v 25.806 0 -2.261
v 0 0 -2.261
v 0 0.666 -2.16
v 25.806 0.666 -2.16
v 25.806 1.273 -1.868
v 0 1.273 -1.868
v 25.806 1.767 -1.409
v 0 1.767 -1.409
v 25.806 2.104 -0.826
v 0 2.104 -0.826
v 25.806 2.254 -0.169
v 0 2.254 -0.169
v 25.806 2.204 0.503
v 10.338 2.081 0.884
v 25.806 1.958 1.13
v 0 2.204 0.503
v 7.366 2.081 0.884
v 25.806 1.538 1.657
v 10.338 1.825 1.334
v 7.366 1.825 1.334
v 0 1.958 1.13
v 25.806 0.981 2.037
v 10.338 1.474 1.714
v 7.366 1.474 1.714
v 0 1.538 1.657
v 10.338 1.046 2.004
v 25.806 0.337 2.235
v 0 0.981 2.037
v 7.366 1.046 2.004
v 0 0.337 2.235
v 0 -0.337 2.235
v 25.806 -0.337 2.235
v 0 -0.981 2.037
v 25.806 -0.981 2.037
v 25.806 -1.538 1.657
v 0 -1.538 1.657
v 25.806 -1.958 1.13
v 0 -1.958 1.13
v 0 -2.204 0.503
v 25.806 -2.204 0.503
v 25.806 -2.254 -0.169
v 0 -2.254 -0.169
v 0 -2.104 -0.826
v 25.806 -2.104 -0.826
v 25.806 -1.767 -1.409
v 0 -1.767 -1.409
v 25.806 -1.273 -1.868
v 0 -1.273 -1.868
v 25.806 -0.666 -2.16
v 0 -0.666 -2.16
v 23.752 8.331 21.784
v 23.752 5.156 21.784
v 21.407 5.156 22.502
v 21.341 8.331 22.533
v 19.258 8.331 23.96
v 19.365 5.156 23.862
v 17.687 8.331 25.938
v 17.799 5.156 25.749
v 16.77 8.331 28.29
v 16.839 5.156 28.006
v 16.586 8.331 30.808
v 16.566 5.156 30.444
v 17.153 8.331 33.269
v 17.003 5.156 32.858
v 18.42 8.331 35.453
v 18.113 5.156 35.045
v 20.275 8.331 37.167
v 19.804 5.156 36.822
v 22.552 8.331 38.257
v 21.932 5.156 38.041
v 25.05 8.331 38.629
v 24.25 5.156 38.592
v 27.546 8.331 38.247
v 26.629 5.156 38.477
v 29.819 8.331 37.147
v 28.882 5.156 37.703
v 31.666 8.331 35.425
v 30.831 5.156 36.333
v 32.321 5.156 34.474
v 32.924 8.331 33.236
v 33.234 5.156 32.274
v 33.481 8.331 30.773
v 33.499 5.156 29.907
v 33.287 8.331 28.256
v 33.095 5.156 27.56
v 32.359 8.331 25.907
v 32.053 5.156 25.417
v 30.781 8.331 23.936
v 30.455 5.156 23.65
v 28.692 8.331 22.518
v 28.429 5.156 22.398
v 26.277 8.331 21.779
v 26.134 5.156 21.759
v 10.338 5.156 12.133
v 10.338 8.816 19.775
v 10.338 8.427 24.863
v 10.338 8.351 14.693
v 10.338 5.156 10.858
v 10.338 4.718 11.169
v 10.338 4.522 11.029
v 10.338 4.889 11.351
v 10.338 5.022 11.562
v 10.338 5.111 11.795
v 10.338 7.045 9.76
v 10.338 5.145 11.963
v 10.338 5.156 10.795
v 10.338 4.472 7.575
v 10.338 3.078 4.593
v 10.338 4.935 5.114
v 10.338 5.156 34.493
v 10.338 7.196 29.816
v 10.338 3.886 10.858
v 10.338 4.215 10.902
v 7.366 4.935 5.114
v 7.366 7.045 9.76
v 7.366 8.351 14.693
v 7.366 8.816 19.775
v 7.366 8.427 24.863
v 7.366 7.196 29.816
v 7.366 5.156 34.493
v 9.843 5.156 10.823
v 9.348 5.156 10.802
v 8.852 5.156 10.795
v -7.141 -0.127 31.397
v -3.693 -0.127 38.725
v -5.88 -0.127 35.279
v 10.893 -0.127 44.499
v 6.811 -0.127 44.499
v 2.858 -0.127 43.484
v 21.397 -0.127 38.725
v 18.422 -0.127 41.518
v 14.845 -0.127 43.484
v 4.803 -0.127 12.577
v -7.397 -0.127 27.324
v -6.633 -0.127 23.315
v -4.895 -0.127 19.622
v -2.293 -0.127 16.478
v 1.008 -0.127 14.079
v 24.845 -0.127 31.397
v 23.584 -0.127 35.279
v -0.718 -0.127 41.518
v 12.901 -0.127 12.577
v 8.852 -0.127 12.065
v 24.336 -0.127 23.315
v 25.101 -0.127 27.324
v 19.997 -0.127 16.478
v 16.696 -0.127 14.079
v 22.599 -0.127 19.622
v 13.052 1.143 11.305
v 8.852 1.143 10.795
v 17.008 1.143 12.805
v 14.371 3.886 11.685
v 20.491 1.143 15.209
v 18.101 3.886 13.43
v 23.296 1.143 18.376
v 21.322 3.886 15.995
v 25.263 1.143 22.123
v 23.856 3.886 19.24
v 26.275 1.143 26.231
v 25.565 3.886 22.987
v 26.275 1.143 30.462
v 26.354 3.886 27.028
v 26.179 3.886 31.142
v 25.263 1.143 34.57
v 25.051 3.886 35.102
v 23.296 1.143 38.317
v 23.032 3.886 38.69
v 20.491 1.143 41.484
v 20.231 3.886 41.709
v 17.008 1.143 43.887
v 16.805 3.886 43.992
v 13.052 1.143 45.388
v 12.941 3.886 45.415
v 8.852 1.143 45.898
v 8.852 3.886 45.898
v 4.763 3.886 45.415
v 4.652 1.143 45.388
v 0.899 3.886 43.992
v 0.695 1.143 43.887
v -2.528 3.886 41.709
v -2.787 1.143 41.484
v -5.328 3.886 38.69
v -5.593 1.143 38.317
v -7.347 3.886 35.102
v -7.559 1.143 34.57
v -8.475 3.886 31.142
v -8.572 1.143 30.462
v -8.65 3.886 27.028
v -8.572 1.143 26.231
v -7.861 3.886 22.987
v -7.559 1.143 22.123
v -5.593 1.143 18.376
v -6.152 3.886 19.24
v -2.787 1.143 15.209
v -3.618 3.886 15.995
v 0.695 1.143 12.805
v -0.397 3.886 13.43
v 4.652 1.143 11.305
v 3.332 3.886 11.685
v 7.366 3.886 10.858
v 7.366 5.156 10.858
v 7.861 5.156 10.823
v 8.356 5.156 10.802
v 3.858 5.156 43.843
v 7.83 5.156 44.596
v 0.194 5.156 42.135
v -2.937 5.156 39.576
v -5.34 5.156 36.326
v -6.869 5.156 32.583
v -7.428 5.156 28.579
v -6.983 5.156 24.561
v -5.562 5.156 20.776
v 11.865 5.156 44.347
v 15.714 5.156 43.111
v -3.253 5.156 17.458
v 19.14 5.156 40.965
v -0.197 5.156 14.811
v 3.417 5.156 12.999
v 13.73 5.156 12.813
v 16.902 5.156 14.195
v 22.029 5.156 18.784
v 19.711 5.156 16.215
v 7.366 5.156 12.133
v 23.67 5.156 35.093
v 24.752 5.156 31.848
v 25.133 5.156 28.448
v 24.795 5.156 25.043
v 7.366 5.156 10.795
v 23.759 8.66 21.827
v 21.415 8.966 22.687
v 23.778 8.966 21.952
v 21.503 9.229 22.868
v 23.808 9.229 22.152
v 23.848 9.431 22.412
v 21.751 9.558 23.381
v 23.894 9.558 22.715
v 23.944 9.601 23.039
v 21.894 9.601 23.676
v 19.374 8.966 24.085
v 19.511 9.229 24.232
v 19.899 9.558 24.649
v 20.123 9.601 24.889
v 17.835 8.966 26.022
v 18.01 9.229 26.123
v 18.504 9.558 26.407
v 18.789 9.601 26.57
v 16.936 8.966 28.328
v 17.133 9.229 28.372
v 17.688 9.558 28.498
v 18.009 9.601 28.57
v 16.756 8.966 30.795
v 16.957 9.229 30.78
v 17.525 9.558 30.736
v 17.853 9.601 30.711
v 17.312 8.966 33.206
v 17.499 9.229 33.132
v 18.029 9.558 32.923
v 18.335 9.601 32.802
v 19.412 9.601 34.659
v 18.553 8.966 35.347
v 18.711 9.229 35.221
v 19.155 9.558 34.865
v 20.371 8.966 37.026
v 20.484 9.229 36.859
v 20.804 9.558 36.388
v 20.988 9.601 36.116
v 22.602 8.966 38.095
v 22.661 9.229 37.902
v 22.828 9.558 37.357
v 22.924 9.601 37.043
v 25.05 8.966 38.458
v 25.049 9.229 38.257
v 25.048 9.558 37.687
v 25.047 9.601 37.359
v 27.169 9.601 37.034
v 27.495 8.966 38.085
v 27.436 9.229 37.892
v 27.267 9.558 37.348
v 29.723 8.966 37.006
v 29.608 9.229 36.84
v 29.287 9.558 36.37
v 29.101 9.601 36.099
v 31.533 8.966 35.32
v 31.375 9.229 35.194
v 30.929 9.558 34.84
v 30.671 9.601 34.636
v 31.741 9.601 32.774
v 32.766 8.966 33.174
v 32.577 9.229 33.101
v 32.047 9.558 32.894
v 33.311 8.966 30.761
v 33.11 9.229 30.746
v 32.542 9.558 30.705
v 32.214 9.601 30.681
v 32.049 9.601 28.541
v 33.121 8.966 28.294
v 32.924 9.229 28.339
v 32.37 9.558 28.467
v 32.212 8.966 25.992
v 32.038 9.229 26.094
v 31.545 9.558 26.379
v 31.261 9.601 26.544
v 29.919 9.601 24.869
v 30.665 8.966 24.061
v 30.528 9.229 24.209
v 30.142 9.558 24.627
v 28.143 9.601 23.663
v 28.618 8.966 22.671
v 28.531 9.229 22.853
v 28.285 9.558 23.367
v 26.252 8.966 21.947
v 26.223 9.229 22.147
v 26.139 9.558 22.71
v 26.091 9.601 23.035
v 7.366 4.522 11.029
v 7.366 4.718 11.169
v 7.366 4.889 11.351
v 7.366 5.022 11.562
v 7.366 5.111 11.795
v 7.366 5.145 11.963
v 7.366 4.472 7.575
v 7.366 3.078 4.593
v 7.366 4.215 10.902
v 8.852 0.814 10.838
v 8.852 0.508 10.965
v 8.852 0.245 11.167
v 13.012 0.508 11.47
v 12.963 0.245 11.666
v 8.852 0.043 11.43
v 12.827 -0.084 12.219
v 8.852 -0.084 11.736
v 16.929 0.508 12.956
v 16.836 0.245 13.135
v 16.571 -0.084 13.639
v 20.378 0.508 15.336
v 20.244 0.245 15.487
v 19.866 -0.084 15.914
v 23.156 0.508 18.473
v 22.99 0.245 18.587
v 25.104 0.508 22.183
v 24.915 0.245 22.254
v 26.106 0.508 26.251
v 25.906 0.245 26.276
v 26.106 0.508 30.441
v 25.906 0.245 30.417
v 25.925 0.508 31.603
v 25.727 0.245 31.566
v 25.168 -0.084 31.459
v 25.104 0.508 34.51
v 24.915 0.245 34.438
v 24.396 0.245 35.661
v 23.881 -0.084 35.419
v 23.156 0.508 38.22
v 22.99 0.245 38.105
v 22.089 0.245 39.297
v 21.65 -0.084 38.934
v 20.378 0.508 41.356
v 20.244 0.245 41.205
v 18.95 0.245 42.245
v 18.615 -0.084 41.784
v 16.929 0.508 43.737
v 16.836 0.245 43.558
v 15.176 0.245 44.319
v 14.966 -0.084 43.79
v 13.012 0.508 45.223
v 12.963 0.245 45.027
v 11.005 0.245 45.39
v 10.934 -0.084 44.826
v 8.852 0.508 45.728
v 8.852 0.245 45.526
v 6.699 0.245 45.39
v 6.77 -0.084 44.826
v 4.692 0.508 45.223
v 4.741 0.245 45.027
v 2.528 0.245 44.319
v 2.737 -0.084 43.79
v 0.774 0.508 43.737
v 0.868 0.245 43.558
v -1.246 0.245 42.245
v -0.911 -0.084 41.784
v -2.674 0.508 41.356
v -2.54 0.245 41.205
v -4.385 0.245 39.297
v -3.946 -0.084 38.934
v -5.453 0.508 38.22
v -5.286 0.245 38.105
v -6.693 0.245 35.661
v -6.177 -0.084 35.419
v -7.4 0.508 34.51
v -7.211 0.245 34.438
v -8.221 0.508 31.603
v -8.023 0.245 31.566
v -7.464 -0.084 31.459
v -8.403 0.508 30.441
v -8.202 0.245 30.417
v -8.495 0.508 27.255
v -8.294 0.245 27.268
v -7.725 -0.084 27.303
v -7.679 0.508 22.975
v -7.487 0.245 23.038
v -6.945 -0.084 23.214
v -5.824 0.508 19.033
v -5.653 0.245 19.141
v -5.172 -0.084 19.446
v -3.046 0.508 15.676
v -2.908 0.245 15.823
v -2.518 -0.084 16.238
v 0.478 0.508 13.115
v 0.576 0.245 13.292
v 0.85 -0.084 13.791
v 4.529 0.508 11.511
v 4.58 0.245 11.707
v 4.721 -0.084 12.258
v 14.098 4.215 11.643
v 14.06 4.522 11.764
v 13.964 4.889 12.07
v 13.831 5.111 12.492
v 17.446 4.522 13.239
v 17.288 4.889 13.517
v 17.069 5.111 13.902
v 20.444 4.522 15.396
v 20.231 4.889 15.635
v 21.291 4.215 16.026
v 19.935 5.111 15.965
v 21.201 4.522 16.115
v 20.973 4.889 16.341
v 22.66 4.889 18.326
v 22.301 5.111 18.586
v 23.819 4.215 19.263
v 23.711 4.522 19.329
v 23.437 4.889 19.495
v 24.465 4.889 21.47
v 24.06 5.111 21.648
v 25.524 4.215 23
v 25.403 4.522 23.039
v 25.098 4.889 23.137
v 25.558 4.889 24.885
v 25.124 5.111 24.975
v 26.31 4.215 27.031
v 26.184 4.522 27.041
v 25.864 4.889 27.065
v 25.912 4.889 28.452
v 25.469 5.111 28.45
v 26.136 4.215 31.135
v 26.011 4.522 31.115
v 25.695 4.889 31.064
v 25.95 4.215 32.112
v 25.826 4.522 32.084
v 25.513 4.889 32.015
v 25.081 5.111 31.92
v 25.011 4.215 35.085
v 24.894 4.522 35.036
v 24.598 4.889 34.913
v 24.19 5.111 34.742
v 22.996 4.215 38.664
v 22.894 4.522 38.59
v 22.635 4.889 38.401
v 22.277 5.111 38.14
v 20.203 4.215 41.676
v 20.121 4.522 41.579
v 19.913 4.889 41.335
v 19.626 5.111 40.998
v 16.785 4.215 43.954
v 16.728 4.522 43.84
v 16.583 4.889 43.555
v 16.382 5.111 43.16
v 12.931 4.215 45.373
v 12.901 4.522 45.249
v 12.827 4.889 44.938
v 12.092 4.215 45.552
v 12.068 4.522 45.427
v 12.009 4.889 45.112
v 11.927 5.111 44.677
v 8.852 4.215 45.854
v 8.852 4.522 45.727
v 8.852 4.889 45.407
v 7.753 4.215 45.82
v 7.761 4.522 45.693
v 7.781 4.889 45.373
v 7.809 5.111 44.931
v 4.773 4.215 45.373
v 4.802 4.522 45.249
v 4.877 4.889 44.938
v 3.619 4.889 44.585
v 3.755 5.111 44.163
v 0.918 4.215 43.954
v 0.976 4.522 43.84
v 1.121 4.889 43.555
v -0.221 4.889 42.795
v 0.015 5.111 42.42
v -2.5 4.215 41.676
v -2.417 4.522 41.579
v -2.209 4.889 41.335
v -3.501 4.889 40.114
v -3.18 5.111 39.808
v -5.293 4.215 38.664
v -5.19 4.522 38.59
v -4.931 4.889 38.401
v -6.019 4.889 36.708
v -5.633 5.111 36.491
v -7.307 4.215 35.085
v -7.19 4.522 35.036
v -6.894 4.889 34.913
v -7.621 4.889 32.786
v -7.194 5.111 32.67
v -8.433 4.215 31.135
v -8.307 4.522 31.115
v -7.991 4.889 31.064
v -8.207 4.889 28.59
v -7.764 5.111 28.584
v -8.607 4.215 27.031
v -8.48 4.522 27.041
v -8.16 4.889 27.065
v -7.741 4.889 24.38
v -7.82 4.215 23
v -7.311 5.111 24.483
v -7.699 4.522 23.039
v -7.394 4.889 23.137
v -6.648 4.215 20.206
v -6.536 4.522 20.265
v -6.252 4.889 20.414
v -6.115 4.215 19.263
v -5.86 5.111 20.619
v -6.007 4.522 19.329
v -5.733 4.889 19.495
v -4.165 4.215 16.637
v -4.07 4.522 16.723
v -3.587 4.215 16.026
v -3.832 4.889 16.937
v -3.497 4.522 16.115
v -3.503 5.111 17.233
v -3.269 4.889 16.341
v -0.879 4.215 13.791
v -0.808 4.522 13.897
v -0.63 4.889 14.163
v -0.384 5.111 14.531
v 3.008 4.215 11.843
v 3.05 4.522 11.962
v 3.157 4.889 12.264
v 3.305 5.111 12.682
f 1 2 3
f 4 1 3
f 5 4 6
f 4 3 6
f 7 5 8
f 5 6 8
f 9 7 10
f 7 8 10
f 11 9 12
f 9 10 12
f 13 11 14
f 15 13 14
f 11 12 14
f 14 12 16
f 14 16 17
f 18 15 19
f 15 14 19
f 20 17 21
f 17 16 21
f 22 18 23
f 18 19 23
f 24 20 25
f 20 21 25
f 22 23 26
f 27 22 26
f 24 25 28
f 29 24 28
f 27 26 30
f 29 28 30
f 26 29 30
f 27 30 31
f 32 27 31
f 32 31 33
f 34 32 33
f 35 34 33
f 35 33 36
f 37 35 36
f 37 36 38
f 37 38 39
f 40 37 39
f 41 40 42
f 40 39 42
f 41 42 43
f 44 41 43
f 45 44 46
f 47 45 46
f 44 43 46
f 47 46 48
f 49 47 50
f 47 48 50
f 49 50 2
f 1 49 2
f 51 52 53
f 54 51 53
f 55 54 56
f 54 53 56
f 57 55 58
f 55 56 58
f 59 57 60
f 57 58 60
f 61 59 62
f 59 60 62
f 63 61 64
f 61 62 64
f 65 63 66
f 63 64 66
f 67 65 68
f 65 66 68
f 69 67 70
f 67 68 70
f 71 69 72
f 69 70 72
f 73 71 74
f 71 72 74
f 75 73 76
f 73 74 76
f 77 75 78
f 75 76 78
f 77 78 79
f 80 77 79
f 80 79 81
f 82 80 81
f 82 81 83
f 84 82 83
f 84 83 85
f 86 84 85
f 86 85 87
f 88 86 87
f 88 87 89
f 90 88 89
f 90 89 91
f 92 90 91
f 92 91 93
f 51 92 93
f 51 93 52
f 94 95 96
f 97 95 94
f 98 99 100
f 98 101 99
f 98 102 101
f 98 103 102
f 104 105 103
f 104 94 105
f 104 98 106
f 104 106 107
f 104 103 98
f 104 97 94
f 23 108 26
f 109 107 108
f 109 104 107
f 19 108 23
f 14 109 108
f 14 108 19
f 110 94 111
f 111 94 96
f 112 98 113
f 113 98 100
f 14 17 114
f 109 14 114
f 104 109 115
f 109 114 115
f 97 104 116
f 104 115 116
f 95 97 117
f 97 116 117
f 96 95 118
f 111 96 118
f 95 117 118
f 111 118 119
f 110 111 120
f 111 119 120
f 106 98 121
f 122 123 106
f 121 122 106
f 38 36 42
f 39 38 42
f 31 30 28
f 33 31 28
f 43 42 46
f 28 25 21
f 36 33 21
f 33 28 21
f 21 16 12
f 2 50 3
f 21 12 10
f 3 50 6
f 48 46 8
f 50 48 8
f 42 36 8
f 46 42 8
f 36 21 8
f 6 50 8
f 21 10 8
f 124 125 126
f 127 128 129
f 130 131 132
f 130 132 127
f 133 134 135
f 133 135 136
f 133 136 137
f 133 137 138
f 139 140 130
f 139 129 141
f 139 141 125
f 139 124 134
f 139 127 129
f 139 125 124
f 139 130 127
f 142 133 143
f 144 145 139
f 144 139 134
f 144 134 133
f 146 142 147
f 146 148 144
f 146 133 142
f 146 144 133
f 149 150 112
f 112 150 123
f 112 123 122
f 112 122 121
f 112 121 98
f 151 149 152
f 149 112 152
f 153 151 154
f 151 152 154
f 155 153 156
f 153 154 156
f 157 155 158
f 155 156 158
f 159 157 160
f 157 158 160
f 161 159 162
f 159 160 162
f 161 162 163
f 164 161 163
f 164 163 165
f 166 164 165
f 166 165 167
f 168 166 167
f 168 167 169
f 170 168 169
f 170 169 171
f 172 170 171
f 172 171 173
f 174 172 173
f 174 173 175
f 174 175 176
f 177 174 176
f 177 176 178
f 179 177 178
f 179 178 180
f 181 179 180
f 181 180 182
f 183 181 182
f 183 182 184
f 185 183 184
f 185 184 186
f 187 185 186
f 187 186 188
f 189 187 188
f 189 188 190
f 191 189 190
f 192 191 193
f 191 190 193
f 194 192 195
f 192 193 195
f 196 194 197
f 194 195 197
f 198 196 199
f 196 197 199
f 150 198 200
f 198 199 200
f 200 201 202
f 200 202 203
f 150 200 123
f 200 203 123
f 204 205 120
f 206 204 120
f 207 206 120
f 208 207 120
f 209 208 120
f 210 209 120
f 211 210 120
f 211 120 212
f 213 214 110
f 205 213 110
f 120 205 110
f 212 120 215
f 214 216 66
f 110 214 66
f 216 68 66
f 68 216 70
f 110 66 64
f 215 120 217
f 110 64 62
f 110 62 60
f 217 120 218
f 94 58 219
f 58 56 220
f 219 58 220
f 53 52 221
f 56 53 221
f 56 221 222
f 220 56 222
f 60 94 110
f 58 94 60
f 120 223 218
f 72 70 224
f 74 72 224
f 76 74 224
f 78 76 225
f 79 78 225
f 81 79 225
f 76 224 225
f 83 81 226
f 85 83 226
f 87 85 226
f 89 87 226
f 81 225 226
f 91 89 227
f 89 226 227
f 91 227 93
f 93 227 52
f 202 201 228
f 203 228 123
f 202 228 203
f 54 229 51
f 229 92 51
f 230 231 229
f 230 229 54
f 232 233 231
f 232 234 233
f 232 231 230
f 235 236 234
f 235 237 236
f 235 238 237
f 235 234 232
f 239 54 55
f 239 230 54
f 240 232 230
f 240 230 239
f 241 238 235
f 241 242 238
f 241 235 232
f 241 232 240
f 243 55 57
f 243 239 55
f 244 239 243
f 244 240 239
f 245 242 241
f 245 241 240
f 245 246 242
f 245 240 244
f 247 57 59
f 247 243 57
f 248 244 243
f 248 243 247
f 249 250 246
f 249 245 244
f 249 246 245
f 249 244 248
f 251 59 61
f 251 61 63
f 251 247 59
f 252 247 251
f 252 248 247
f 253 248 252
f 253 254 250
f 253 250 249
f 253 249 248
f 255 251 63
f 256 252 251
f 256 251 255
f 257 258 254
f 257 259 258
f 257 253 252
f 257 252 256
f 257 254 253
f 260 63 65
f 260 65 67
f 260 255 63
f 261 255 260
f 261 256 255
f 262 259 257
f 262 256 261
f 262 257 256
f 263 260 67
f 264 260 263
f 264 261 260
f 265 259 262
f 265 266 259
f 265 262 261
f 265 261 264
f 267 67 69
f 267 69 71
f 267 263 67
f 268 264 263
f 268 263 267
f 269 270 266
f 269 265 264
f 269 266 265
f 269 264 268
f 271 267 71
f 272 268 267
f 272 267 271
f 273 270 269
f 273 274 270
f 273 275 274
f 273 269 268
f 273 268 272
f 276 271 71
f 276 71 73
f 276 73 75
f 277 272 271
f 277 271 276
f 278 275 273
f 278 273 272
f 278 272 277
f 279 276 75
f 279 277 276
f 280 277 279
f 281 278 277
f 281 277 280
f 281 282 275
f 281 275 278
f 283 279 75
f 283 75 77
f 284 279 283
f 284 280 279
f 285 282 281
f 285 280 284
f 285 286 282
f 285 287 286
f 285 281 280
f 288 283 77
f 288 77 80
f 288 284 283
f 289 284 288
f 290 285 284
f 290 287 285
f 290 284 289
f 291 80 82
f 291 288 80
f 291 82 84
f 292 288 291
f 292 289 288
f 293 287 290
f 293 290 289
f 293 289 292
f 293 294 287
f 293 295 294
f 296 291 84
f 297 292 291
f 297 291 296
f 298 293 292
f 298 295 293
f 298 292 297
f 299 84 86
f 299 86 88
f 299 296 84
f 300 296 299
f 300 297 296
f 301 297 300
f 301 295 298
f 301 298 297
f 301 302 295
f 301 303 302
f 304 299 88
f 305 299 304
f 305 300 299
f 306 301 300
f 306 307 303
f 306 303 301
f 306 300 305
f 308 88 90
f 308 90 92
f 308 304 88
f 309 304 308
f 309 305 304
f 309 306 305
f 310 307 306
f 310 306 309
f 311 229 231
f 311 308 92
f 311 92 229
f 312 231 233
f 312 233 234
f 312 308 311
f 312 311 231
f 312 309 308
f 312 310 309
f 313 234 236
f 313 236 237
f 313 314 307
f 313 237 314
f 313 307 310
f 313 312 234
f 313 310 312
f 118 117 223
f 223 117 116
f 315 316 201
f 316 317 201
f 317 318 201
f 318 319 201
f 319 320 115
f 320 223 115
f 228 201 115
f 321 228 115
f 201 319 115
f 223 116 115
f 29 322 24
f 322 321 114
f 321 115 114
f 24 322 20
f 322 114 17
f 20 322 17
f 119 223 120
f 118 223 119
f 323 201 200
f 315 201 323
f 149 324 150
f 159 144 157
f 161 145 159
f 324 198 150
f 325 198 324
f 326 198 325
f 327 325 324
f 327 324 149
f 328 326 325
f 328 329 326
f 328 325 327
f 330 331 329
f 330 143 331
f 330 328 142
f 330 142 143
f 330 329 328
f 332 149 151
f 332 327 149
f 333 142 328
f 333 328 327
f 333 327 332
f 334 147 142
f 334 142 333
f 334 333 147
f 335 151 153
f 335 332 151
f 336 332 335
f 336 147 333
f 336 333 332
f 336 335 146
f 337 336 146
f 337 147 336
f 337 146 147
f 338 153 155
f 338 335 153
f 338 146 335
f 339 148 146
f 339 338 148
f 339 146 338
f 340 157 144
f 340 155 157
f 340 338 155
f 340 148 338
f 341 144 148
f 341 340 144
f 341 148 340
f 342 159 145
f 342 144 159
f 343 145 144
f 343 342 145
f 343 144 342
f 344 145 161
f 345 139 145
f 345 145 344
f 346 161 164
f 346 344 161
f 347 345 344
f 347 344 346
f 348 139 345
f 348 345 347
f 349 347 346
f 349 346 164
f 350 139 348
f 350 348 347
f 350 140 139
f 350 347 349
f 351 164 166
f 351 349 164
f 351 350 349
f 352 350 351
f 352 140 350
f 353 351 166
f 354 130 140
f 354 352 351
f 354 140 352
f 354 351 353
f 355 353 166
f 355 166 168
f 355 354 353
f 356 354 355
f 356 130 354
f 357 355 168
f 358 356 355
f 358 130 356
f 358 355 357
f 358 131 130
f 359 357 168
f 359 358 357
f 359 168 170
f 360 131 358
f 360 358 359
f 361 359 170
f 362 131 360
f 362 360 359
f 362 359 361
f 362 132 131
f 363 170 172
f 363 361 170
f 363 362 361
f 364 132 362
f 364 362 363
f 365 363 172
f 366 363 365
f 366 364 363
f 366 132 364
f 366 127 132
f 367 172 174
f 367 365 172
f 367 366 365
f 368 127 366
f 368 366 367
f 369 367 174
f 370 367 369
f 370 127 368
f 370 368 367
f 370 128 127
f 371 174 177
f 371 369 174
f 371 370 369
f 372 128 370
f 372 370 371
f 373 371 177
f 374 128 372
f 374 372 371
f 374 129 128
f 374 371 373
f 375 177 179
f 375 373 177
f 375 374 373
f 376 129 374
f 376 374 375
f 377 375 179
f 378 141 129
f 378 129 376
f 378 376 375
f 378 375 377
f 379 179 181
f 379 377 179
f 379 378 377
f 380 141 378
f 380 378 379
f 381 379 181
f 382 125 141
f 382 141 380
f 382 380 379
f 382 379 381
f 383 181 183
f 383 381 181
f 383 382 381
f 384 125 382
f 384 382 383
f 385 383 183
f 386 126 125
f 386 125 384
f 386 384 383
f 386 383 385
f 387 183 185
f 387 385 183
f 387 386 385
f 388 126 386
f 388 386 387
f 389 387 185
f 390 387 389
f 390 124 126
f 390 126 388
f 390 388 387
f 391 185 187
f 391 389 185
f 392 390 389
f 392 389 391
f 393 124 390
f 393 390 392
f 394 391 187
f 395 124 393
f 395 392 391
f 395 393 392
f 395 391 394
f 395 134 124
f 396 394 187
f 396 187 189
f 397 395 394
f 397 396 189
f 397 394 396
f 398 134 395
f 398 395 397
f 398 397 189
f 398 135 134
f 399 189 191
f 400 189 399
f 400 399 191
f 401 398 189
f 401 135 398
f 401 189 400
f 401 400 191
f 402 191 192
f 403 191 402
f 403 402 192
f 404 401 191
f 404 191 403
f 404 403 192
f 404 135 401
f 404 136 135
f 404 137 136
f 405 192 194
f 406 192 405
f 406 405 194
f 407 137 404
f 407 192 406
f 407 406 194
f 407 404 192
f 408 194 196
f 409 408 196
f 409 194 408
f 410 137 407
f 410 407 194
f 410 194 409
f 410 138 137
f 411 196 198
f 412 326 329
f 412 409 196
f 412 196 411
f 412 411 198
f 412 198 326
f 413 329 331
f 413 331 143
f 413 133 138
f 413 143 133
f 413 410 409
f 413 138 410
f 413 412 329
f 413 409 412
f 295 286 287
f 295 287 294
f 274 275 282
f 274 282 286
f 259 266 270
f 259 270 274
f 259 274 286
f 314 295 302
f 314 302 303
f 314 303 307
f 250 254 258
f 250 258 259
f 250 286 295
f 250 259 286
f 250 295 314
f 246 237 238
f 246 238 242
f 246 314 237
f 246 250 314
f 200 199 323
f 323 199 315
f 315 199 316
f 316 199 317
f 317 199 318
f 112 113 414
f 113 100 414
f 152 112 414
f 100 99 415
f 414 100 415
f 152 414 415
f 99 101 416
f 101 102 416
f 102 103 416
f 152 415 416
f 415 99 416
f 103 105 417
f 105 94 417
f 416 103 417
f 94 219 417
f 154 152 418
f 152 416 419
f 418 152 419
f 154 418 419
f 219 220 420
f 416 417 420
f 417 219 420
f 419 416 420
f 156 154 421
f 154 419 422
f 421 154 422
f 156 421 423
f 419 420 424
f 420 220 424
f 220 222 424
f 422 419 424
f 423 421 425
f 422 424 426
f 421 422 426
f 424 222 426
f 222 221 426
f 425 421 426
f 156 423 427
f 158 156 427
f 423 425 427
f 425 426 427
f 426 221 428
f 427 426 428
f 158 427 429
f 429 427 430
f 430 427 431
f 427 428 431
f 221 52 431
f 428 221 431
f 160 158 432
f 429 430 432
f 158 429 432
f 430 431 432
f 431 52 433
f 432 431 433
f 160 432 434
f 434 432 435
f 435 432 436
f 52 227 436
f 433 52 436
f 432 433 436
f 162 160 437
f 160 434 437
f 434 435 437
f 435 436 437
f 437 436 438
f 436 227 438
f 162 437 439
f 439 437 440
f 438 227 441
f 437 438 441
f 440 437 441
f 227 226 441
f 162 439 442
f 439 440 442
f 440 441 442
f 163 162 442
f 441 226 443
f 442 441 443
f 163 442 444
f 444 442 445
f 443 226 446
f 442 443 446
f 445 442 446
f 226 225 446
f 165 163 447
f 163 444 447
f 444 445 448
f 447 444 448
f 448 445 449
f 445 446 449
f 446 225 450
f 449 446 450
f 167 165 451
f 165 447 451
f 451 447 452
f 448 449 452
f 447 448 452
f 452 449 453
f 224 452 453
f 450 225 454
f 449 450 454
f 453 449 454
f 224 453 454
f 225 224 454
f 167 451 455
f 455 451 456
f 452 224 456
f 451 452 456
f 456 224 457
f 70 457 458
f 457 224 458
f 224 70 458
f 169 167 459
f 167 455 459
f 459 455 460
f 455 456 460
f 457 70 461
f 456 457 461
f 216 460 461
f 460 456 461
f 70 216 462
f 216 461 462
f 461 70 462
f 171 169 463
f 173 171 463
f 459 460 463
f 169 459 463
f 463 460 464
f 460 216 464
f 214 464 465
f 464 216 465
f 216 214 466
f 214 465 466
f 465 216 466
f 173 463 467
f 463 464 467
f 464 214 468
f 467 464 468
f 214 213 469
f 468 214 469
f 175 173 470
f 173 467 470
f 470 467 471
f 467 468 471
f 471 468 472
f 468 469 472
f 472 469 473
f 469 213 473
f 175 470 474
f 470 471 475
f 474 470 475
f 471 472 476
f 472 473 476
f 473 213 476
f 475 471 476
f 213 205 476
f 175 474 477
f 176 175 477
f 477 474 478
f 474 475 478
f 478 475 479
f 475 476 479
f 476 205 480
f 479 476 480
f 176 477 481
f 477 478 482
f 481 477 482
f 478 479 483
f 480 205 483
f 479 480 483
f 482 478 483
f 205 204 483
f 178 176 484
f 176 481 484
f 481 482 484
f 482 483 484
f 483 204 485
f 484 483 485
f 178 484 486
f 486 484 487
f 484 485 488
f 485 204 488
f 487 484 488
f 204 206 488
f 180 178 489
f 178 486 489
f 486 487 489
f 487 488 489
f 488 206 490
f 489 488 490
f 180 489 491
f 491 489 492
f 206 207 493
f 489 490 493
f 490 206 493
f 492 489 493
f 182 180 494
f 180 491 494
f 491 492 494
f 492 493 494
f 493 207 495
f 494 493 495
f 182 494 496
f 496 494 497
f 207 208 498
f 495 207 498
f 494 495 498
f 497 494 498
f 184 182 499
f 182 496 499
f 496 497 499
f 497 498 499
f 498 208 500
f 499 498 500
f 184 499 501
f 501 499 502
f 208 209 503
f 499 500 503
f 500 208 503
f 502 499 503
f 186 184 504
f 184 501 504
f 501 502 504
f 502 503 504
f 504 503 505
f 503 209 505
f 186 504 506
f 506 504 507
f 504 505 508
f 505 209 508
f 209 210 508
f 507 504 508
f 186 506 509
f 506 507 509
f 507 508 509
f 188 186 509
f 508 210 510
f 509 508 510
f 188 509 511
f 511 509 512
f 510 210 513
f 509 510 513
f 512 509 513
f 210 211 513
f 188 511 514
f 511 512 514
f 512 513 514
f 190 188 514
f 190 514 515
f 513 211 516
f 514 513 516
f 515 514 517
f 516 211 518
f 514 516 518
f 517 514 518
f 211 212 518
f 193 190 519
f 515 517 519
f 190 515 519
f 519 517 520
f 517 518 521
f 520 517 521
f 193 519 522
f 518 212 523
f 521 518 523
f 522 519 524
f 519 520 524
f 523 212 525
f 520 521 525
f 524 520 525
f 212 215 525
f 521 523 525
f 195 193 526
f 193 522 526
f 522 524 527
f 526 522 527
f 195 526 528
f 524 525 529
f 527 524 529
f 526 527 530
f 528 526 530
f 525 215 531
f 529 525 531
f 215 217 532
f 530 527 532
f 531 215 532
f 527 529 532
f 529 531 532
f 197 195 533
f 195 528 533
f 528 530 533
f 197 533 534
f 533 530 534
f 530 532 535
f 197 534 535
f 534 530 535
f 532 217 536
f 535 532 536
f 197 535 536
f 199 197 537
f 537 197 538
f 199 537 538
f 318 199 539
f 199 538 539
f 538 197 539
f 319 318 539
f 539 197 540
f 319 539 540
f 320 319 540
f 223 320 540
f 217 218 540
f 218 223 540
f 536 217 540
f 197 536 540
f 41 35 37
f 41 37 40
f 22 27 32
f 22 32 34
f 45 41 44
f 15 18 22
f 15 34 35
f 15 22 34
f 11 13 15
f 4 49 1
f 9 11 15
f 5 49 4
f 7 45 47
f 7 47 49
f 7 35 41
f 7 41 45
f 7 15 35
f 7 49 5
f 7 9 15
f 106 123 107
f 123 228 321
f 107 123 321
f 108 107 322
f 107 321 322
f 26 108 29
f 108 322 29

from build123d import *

# Parameters (mm, degrees)
SKETCH1_R           = 2.2606
BOSS_EXTRUDE1_DEPTH = 25.8064
BOSS_EXTRUDE2_DEPTH = 2.9718
SKETCH3_R           = 17.5514
BOSS_EXTRUDE3_DEPTH = 5.2832
FILLET1_R           = 1.27
SKETCH4_R           = 8.4709
BOSS_EXTRUDE4_DEPTH = 4.445
FILLET2_R           = 1.27


with BuildPart() as part:
    # Sketch1 → Boss-Extrude1 (new body)
    with BuildSketch(Plane(origin=(0, 0, 0), x_dir=(0, 0, -1), z_dir=(1, 0, 0))):
        Circle(SKETCH1_R)
    extrude(amount=BOSS_EXTRUDE1_DEPTH)

    # Sketch2 → Boss-Extrude2 (add)
    with BuildSketch(Plane(origin=(7.366, 0, 0), x_dir=(0, 0, -1), z_dir=(1, 0, 0))):
        with BuildLine():
            Line((-34.4932, 5.1562), (-10.795, 5.1562))
            ThreePointArc((-10.795, 5.1562), (-4.640157933, 3.106734389), (0, -1.426622482))
            Line((0, -1.426622482), (0, 1.341450991))
            ThreePointArc((0, 1.341450991), (-16.651297211, 8.631590684), (-34.4932, 5.1562))
        make_face()
    extrude(amount=BOSS_EXTRUDE2_DEPTH)

    # Sketch3 → Boss-Extrude3 (add)
    with BuildSketch(Plane.XZ.offset(-5.1562)):
        with Locations(Location((8.8519, 28.3464, 0), (0, 0, 270))):
            Circle(SKETCH3_R)
    extrude(amount=BOSS_EXTRUDE3_DEPTH)

    # Fillet1
    fillet1_edges = [part.edges().sort_by_distance(p)[0] for p in [
        (8.8519, 5.1562, 45.8978),
        (8.8519, -0.127, 45.8978),
    ]]
    fillet(fillet1_edges, radius=FILLET1_R)

    # Sketch4 → Boss-Extrude4 (add)
    with BuildSketch(Plane(origin=(0, 5.1562, 0), x_dir=(1, 0, 0), z_dir=(0, 1, 0))):
        with Locations(Location((25.032233899, -30.157692599, 0), (0, 0, 98.691062449))):
            Circle(SKETCH4_R)
    extrude(amount=BOSS_EXTRUDE4_DEPTH)

    # Fillet2
    fillet2_edges = [part.edges().sort_by_distance(p)[0] for p in [
        (26.312242996, 9.6012, 38.531325234),
    ]]
    fillet(fillet2_edges, radius=FILLET2_R)


solid = part.part
